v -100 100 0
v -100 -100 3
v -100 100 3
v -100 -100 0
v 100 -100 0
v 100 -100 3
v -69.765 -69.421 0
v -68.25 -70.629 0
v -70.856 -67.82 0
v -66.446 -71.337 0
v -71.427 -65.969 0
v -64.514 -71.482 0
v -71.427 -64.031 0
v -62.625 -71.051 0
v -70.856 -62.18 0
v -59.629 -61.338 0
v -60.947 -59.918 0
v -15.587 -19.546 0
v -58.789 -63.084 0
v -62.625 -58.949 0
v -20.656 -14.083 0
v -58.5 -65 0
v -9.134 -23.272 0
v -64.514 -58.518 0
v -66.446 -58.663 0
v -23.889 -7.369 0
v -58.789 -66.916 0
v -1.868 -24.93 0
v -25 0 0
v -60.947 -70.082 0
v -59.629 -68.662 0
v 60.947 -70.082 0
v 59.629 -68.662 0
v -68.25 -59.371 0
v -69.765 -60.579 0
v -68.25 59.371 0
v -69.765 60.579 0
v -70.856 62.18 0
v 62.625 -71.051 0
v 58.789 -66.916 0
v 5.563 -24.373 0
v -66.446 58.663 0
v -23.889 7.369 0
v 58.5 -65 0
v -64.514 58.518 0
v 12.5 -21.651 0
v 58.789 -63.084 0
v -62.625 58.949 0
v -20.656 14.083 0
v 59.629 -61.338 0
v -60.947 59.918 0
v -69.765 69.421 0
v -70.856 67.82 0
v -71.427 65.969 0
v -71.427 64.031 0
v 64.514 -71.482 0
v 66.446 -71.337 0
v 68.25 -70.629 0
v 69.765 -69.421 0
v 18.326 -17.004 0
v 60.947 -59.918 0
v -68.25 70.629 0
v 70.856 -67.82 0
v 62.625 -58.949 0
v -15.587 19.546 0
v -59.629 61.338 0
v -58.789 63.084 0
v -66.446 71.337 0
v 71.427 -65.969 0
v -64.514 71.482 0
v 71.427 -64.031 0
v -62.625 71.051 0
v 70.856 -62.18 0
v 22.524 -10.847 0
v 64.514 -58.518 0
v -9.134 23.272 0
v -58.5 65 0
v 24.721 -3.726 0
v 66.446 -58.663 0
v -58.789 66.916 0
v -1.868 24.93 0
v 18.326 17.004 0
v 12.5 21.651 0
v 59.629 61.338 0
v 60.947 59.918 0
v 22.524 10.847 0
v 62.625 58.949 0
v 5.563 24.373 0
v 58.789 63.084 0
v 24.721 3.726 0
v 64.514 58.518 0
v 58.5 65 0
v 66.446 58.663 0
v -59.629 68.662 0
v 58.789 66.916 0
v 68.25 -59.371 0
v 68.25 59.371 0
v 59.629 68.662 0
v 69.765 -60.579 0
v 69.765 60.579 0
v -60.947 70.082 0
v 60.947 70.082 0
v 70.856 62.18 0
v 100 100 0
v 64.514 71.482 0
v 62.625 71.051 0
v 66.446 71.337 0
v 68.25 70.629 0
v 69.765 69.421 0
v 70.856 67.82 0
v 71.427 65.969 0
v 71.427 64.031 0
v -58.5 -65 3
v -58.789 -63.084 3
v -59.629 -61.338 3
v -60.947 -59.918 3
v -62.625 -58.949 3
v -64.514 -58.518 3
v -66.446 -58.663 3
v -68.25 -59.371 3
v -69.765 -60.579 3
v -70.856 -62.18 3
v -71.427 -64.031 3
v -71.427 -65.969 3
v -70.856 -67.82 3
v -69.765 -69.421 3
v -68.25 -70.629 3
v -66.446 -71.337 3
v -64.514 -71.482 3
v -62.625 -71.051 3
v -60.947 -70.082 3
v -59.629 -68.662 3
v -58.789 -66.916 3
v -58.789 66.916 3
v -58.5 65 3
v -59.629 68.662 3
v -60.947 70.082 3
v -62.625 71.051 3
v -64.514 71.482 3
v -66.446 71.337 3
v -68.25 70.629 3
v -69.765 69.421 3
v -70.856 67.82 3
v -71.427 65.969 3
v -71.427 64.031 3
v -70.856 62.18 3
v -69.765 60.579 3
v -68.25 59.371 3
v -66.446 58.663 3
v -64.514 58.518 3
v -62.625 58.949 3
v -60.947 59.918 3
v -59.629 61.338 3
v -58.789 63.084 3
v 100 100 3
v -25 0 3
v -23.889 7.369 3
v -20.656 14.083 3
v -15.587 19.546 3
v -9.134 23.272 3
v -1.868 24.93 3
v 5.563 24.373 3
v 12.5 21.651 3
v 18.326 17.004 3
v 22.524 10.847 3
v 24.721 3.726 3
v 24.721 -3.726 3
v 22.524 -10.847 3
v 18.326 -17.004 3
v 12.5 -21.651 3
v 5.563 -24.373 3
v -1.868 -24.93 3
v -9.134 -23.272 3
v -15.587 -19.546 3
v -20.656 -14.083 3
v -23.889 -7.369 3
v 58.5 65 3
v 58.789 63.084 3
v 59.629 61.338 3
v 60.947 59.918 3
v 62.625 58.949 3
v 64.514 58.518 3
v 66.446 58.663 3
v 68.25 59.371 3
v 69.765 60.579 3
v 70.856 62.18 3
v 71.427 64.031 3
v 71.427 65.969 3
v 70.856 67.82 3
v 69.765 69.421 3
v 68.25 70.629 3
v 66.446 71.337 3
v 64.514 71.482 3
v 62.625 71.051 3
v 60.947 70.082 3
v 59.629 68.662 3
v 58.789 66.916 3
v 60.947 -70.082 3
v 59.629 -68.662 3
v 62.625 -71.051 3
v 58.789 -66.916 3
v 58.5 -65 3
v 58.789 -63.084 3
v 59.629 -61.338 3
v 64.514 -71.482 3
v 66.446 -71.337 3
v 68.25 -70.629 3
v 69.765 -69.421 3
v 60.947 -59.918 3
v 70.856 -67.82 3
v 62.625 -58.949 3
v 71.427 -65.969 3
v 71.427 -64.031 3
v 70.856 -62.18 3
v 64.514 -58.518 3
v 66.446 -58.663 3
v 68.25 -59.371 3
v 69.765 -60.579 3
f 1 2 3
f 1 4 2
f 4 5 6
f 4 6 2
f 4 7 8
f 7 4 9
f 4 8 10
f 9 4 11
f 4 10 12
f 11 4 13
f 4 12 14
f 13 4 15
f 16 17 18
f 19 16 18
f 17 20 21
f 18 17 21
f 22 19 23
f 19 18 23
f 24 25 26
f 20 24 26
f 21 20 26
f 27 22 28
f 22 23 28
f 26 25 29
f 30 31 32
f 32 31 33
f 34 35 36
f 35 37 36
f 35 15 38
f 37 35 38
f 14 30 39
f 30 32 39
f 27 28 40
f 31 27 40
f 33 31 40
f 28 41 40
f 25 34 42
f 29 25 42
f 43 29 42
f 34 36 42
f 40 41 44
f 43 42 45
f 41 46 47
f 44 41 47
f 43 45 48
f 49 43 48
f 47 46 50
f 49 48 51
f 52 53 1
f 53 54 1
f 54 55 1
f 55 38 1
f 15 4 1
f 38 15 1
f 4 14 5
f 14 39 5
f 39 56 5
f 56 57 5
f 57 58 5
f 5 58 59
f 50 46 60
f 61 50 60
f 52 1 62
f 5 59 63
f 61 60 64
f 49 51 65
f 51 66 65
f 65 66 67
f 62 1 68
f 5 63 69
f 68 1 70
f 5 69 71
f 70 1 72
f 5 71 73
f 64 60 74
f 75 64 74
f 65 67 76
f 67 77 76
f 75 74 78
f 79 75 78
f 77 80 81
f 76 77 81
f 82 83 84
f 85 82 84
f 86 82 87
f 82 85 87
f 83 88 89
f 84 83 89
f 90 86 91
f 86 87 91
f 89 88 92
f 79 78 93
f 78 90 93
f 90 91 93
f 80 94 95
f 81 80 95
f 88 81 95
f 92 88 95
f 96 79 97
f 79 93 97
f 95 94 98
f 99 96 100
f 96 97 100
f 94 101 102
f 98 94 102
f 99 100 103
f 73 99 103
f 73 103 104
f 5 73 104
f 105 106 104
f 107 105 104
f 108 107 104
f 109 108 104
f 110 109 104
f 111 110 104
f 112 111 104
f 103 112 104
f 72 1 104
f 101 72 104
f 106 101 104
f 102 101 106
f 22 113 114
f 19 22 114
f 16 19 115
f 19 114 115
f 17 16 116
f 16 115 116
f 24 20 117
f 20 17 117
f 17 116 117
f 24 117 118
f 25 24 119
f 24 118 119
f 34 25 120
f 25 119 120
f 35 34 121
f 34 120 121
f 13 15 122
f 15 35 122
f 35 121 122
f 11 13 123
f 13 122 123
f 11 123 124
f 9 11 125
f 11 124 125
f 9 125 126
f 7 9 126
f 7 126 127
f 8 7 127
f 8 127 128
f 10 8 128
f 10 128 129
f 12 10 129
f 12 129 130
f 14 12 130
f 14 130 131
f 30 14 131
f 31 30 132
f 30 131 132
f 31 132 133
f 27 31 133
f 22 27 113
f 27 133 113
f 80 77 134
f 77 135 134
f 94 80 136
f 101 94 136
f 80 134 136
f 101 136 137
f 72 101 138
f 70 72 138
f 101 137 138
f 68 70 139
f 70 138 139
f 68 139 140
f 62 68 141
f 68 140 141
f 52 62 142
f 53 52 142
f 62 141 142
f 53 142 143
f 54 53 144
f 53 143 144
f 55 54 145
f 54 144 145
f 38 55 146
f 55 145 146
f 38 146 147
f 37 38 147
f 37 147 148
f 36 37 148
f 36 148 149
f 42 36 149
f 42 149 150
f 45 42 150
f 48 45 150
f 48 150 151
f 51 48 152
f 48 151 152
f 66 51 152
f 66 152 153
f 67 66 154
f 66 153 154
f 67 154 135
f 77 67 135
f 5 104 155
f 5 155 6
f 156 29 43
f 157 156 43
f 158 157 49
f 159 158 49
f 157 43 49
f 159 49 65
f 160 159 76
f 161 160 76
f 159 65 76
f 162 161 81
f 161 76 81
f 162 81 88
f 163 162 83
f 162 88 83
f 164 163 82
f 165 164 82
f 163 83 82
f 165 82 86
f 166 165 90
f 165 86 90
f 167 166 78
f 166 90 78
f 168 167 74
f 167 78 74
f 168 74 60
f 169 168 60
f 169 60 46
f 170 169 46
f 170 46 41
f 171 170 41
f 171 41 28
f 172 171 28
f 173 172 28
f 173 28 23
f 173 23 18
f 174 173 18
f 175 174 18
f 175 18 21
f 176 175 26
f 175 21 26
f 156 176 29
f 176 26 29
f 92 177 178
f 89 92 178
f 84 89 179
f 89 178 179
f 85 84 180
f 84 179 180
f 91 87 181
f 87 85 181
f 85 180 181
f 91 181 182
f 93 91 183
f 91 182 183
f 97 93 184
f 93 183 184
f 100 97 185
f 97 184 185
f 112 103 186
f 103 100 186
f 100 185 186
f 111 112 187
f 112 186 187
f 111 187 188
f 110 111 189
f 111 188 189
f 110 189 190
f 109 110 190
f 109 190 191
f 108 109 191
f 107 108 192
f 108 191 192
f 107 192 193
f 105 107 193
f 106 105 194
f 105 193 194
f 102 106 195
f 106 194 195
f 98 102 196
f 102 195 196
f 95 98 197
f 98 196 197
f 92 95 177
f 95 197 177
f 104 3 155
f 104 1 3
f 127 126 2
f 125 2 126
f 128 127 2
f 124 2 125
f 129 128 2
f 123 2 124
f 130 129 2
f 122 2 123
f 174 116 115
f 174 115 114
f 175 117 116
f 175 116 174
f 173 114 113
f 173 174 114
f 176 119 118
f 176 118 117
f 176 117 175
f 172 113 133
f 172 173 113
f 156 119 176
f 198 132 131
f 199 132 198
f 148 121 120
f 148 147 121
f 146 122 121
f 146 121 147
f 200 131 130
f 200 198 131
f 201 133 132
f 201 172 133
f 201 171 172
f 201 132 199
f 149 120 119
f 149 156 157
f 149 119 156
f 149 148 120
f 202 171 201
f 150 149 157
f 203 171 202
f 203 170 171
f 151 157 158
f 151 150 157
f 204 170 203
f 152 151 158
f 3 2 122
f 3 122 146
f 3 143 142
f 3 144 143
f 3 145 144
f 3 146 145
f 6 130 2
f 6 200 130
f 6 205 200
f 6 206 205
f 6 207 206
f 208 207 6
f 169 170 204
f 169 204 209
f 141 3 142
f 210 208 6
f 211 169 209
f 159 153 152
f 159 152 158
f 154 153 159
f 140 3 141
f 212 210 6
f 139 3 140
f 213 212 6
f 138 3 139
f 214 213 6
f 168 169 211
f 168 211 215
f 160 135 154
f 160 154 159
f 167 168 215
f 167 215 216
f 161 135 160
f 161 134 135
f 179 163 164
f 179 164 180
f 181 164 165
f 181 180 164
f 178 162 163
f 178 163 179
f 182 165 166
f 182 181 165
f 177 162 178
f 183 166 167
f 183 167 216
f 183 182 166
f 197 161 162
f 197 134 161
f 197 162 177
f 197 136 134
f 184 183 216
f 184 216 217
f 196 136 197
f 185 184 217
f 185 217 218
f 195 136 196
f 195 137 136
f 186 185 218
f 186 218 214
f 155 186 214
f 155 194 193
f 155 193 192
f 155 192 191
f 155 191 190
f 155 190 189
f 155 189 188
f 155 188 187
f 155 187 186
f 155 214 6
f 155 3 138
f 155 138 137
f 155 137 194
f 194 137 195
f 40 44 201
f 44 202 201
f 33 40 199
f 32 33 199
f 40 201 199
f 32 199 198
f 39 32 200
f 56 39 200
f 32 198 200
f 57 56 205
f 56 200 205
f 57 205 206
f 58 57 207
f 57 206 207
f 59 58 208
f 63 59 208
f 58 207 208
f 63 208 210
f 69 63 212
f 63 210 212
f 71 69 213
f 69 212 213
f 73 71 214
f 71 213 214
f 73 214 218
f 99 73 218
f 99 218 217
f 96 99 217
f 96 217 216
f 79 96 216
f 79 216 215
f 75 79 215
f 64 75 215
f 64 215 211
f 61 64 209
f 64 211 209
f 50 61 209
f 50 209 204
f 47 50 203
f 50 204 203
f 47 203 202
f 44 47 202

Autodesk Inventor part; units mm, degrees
ref_plane "YZ Plane" through (0, 0, 0) normal (1, 0, 0) x (0, 1, 0)
ref_plane "XZ Plane" through (0, 0, 0) normal (0, 1, 0) x (-1, 0, 0)
ref_plane "XY Plane" through (0, 0, 0) normal (0, 0, 1) x (1, 0, 0)
sketch "Sketch1" plane through (0, 0, 0) normal (0, 0, 1) x (1, 0, 0)
  line L0 (-100, 100) -> (100, 100)
  line L1 (100, 100) -> (100, -100)
  line L2 (100, -100) -> (-100, -100)
  line L3 (-100, -100) -> (-100, 100)
  line L4 (-100, 100) -> (100, -100) construction
  line L5 (100, 100) -> (-100, -100) construction
  point P0 (0, 0)
  point P1 (0, 0)
  point P2 (0, 0)
  dimension "d25" = 200
  dimension "d26" = 200
extrude "Plate1" add sketch "Sketch1" along normal blind 3
sketch "Sketch6" plane through (0, 0, 3) normal (0, 0, 1) x (1, 0, 0)
  circle A0 centre (-75, 0) radius 15
  circle A1 centre (75, 0) radius 15
  line L0 (0, 0) -> (0, 55.0725) construction
  dimension "d37" = 30
  dimension "d38" = 150
cut "Cut1" [suppressed]
sketch "Sketch8" plane through (0, 0, 0) normal (1, 0, 0) x (0, 1, 0)
  line L0 (-94.2929, 40) -> (94.2929, 40) projected
  circle A0 centre (0, 30) radius 6.5
  line L1 (89.2929, 5) -> (-89.2929, 5) projected
  point P0 (0, 0)
  dimension "d48" = 13
  dimension "d49" = 25
extrude "Extrusion3" [suppressed]
pattern_linear "Rectangular Pattern2" [suppressed]
sketch "Sketch9" plane through (0, 0, 3) normal (0, 0, 1) x (1, 0, 0)
  circle A0 centre (-65, 65) radius 6.5
  point P0 (0, 0)
  point P1 (-225, 65)
  dimension "d55" = 13
  dimension "d73" = 65
  dimension "d74" = 65
extrude "Cut2" cut sketch "Sketch9" against normal blind 3
mirror "Mirror1" about plane through (0, 0, 0) normal (1, 0, 0) of "Cut2"
mirror "Mirror2" about plane through (0, 0, 0) normal (0, 1, 0) of "Cut2", "Mirror1"
sketch "Sketch10" plane through (0, 0, 0) normal (0, 0, -1) x (-1, 0, 0)
  circle A0 centre (0, 0) radius 25
  dimension "d75" = 50
extrude "Cut3" cut sketch "Sketch10" against normal blind 3
equation "\"d74\" = d73"
equation "\"d26\" = Гриндер_высота"
equation "\"d38\" = Гриндер_Валы_между_центрами"
equation "\"d39\" = Thickness"
equation "\"d48\" = Гриндер_диам_отврс_корпуса"
equation "\"d49\" = Гриндер_отступ_отврс_корпуса"
equation "\"d55\" = Гриндер_диам_отврс_корпуса"
equation "\"d57\" = Thickness"
equation "\"d76\" = Thickness"
equation "\"d2\" = Thickness"
equation "\"BendReliefWidth\" = Thickness"
equation "\"BendReliefDepth\" = 0.5 * Thickness"
equation "\"CornerReliefSize\" = 4 * Thickness"
equation "\"MinimumRemnant\" = 2 * Thickness"
equation "\"TransitionRadius\" = BendRadius"
equation "\"JacobiRadiusSize\" = BendRadius"
equation "\"GapSize\" = Thickness"
equation "\"Гриндер_отступ_отврс_корпуса\" = 25"
equation "\"Гриндер_диам_отврс_корпуса\" = 13"
equation "\"Гриндер_высота\" = 200"
equation "\"Гриндер_Валы_между_центрами\" = 150"
equation "\"Thickness\" = 3"
equation "\"BendRadius\" = 5"
properties part number "NDM-VOS 777 sredder wall 7" material "Stainless Steel"
